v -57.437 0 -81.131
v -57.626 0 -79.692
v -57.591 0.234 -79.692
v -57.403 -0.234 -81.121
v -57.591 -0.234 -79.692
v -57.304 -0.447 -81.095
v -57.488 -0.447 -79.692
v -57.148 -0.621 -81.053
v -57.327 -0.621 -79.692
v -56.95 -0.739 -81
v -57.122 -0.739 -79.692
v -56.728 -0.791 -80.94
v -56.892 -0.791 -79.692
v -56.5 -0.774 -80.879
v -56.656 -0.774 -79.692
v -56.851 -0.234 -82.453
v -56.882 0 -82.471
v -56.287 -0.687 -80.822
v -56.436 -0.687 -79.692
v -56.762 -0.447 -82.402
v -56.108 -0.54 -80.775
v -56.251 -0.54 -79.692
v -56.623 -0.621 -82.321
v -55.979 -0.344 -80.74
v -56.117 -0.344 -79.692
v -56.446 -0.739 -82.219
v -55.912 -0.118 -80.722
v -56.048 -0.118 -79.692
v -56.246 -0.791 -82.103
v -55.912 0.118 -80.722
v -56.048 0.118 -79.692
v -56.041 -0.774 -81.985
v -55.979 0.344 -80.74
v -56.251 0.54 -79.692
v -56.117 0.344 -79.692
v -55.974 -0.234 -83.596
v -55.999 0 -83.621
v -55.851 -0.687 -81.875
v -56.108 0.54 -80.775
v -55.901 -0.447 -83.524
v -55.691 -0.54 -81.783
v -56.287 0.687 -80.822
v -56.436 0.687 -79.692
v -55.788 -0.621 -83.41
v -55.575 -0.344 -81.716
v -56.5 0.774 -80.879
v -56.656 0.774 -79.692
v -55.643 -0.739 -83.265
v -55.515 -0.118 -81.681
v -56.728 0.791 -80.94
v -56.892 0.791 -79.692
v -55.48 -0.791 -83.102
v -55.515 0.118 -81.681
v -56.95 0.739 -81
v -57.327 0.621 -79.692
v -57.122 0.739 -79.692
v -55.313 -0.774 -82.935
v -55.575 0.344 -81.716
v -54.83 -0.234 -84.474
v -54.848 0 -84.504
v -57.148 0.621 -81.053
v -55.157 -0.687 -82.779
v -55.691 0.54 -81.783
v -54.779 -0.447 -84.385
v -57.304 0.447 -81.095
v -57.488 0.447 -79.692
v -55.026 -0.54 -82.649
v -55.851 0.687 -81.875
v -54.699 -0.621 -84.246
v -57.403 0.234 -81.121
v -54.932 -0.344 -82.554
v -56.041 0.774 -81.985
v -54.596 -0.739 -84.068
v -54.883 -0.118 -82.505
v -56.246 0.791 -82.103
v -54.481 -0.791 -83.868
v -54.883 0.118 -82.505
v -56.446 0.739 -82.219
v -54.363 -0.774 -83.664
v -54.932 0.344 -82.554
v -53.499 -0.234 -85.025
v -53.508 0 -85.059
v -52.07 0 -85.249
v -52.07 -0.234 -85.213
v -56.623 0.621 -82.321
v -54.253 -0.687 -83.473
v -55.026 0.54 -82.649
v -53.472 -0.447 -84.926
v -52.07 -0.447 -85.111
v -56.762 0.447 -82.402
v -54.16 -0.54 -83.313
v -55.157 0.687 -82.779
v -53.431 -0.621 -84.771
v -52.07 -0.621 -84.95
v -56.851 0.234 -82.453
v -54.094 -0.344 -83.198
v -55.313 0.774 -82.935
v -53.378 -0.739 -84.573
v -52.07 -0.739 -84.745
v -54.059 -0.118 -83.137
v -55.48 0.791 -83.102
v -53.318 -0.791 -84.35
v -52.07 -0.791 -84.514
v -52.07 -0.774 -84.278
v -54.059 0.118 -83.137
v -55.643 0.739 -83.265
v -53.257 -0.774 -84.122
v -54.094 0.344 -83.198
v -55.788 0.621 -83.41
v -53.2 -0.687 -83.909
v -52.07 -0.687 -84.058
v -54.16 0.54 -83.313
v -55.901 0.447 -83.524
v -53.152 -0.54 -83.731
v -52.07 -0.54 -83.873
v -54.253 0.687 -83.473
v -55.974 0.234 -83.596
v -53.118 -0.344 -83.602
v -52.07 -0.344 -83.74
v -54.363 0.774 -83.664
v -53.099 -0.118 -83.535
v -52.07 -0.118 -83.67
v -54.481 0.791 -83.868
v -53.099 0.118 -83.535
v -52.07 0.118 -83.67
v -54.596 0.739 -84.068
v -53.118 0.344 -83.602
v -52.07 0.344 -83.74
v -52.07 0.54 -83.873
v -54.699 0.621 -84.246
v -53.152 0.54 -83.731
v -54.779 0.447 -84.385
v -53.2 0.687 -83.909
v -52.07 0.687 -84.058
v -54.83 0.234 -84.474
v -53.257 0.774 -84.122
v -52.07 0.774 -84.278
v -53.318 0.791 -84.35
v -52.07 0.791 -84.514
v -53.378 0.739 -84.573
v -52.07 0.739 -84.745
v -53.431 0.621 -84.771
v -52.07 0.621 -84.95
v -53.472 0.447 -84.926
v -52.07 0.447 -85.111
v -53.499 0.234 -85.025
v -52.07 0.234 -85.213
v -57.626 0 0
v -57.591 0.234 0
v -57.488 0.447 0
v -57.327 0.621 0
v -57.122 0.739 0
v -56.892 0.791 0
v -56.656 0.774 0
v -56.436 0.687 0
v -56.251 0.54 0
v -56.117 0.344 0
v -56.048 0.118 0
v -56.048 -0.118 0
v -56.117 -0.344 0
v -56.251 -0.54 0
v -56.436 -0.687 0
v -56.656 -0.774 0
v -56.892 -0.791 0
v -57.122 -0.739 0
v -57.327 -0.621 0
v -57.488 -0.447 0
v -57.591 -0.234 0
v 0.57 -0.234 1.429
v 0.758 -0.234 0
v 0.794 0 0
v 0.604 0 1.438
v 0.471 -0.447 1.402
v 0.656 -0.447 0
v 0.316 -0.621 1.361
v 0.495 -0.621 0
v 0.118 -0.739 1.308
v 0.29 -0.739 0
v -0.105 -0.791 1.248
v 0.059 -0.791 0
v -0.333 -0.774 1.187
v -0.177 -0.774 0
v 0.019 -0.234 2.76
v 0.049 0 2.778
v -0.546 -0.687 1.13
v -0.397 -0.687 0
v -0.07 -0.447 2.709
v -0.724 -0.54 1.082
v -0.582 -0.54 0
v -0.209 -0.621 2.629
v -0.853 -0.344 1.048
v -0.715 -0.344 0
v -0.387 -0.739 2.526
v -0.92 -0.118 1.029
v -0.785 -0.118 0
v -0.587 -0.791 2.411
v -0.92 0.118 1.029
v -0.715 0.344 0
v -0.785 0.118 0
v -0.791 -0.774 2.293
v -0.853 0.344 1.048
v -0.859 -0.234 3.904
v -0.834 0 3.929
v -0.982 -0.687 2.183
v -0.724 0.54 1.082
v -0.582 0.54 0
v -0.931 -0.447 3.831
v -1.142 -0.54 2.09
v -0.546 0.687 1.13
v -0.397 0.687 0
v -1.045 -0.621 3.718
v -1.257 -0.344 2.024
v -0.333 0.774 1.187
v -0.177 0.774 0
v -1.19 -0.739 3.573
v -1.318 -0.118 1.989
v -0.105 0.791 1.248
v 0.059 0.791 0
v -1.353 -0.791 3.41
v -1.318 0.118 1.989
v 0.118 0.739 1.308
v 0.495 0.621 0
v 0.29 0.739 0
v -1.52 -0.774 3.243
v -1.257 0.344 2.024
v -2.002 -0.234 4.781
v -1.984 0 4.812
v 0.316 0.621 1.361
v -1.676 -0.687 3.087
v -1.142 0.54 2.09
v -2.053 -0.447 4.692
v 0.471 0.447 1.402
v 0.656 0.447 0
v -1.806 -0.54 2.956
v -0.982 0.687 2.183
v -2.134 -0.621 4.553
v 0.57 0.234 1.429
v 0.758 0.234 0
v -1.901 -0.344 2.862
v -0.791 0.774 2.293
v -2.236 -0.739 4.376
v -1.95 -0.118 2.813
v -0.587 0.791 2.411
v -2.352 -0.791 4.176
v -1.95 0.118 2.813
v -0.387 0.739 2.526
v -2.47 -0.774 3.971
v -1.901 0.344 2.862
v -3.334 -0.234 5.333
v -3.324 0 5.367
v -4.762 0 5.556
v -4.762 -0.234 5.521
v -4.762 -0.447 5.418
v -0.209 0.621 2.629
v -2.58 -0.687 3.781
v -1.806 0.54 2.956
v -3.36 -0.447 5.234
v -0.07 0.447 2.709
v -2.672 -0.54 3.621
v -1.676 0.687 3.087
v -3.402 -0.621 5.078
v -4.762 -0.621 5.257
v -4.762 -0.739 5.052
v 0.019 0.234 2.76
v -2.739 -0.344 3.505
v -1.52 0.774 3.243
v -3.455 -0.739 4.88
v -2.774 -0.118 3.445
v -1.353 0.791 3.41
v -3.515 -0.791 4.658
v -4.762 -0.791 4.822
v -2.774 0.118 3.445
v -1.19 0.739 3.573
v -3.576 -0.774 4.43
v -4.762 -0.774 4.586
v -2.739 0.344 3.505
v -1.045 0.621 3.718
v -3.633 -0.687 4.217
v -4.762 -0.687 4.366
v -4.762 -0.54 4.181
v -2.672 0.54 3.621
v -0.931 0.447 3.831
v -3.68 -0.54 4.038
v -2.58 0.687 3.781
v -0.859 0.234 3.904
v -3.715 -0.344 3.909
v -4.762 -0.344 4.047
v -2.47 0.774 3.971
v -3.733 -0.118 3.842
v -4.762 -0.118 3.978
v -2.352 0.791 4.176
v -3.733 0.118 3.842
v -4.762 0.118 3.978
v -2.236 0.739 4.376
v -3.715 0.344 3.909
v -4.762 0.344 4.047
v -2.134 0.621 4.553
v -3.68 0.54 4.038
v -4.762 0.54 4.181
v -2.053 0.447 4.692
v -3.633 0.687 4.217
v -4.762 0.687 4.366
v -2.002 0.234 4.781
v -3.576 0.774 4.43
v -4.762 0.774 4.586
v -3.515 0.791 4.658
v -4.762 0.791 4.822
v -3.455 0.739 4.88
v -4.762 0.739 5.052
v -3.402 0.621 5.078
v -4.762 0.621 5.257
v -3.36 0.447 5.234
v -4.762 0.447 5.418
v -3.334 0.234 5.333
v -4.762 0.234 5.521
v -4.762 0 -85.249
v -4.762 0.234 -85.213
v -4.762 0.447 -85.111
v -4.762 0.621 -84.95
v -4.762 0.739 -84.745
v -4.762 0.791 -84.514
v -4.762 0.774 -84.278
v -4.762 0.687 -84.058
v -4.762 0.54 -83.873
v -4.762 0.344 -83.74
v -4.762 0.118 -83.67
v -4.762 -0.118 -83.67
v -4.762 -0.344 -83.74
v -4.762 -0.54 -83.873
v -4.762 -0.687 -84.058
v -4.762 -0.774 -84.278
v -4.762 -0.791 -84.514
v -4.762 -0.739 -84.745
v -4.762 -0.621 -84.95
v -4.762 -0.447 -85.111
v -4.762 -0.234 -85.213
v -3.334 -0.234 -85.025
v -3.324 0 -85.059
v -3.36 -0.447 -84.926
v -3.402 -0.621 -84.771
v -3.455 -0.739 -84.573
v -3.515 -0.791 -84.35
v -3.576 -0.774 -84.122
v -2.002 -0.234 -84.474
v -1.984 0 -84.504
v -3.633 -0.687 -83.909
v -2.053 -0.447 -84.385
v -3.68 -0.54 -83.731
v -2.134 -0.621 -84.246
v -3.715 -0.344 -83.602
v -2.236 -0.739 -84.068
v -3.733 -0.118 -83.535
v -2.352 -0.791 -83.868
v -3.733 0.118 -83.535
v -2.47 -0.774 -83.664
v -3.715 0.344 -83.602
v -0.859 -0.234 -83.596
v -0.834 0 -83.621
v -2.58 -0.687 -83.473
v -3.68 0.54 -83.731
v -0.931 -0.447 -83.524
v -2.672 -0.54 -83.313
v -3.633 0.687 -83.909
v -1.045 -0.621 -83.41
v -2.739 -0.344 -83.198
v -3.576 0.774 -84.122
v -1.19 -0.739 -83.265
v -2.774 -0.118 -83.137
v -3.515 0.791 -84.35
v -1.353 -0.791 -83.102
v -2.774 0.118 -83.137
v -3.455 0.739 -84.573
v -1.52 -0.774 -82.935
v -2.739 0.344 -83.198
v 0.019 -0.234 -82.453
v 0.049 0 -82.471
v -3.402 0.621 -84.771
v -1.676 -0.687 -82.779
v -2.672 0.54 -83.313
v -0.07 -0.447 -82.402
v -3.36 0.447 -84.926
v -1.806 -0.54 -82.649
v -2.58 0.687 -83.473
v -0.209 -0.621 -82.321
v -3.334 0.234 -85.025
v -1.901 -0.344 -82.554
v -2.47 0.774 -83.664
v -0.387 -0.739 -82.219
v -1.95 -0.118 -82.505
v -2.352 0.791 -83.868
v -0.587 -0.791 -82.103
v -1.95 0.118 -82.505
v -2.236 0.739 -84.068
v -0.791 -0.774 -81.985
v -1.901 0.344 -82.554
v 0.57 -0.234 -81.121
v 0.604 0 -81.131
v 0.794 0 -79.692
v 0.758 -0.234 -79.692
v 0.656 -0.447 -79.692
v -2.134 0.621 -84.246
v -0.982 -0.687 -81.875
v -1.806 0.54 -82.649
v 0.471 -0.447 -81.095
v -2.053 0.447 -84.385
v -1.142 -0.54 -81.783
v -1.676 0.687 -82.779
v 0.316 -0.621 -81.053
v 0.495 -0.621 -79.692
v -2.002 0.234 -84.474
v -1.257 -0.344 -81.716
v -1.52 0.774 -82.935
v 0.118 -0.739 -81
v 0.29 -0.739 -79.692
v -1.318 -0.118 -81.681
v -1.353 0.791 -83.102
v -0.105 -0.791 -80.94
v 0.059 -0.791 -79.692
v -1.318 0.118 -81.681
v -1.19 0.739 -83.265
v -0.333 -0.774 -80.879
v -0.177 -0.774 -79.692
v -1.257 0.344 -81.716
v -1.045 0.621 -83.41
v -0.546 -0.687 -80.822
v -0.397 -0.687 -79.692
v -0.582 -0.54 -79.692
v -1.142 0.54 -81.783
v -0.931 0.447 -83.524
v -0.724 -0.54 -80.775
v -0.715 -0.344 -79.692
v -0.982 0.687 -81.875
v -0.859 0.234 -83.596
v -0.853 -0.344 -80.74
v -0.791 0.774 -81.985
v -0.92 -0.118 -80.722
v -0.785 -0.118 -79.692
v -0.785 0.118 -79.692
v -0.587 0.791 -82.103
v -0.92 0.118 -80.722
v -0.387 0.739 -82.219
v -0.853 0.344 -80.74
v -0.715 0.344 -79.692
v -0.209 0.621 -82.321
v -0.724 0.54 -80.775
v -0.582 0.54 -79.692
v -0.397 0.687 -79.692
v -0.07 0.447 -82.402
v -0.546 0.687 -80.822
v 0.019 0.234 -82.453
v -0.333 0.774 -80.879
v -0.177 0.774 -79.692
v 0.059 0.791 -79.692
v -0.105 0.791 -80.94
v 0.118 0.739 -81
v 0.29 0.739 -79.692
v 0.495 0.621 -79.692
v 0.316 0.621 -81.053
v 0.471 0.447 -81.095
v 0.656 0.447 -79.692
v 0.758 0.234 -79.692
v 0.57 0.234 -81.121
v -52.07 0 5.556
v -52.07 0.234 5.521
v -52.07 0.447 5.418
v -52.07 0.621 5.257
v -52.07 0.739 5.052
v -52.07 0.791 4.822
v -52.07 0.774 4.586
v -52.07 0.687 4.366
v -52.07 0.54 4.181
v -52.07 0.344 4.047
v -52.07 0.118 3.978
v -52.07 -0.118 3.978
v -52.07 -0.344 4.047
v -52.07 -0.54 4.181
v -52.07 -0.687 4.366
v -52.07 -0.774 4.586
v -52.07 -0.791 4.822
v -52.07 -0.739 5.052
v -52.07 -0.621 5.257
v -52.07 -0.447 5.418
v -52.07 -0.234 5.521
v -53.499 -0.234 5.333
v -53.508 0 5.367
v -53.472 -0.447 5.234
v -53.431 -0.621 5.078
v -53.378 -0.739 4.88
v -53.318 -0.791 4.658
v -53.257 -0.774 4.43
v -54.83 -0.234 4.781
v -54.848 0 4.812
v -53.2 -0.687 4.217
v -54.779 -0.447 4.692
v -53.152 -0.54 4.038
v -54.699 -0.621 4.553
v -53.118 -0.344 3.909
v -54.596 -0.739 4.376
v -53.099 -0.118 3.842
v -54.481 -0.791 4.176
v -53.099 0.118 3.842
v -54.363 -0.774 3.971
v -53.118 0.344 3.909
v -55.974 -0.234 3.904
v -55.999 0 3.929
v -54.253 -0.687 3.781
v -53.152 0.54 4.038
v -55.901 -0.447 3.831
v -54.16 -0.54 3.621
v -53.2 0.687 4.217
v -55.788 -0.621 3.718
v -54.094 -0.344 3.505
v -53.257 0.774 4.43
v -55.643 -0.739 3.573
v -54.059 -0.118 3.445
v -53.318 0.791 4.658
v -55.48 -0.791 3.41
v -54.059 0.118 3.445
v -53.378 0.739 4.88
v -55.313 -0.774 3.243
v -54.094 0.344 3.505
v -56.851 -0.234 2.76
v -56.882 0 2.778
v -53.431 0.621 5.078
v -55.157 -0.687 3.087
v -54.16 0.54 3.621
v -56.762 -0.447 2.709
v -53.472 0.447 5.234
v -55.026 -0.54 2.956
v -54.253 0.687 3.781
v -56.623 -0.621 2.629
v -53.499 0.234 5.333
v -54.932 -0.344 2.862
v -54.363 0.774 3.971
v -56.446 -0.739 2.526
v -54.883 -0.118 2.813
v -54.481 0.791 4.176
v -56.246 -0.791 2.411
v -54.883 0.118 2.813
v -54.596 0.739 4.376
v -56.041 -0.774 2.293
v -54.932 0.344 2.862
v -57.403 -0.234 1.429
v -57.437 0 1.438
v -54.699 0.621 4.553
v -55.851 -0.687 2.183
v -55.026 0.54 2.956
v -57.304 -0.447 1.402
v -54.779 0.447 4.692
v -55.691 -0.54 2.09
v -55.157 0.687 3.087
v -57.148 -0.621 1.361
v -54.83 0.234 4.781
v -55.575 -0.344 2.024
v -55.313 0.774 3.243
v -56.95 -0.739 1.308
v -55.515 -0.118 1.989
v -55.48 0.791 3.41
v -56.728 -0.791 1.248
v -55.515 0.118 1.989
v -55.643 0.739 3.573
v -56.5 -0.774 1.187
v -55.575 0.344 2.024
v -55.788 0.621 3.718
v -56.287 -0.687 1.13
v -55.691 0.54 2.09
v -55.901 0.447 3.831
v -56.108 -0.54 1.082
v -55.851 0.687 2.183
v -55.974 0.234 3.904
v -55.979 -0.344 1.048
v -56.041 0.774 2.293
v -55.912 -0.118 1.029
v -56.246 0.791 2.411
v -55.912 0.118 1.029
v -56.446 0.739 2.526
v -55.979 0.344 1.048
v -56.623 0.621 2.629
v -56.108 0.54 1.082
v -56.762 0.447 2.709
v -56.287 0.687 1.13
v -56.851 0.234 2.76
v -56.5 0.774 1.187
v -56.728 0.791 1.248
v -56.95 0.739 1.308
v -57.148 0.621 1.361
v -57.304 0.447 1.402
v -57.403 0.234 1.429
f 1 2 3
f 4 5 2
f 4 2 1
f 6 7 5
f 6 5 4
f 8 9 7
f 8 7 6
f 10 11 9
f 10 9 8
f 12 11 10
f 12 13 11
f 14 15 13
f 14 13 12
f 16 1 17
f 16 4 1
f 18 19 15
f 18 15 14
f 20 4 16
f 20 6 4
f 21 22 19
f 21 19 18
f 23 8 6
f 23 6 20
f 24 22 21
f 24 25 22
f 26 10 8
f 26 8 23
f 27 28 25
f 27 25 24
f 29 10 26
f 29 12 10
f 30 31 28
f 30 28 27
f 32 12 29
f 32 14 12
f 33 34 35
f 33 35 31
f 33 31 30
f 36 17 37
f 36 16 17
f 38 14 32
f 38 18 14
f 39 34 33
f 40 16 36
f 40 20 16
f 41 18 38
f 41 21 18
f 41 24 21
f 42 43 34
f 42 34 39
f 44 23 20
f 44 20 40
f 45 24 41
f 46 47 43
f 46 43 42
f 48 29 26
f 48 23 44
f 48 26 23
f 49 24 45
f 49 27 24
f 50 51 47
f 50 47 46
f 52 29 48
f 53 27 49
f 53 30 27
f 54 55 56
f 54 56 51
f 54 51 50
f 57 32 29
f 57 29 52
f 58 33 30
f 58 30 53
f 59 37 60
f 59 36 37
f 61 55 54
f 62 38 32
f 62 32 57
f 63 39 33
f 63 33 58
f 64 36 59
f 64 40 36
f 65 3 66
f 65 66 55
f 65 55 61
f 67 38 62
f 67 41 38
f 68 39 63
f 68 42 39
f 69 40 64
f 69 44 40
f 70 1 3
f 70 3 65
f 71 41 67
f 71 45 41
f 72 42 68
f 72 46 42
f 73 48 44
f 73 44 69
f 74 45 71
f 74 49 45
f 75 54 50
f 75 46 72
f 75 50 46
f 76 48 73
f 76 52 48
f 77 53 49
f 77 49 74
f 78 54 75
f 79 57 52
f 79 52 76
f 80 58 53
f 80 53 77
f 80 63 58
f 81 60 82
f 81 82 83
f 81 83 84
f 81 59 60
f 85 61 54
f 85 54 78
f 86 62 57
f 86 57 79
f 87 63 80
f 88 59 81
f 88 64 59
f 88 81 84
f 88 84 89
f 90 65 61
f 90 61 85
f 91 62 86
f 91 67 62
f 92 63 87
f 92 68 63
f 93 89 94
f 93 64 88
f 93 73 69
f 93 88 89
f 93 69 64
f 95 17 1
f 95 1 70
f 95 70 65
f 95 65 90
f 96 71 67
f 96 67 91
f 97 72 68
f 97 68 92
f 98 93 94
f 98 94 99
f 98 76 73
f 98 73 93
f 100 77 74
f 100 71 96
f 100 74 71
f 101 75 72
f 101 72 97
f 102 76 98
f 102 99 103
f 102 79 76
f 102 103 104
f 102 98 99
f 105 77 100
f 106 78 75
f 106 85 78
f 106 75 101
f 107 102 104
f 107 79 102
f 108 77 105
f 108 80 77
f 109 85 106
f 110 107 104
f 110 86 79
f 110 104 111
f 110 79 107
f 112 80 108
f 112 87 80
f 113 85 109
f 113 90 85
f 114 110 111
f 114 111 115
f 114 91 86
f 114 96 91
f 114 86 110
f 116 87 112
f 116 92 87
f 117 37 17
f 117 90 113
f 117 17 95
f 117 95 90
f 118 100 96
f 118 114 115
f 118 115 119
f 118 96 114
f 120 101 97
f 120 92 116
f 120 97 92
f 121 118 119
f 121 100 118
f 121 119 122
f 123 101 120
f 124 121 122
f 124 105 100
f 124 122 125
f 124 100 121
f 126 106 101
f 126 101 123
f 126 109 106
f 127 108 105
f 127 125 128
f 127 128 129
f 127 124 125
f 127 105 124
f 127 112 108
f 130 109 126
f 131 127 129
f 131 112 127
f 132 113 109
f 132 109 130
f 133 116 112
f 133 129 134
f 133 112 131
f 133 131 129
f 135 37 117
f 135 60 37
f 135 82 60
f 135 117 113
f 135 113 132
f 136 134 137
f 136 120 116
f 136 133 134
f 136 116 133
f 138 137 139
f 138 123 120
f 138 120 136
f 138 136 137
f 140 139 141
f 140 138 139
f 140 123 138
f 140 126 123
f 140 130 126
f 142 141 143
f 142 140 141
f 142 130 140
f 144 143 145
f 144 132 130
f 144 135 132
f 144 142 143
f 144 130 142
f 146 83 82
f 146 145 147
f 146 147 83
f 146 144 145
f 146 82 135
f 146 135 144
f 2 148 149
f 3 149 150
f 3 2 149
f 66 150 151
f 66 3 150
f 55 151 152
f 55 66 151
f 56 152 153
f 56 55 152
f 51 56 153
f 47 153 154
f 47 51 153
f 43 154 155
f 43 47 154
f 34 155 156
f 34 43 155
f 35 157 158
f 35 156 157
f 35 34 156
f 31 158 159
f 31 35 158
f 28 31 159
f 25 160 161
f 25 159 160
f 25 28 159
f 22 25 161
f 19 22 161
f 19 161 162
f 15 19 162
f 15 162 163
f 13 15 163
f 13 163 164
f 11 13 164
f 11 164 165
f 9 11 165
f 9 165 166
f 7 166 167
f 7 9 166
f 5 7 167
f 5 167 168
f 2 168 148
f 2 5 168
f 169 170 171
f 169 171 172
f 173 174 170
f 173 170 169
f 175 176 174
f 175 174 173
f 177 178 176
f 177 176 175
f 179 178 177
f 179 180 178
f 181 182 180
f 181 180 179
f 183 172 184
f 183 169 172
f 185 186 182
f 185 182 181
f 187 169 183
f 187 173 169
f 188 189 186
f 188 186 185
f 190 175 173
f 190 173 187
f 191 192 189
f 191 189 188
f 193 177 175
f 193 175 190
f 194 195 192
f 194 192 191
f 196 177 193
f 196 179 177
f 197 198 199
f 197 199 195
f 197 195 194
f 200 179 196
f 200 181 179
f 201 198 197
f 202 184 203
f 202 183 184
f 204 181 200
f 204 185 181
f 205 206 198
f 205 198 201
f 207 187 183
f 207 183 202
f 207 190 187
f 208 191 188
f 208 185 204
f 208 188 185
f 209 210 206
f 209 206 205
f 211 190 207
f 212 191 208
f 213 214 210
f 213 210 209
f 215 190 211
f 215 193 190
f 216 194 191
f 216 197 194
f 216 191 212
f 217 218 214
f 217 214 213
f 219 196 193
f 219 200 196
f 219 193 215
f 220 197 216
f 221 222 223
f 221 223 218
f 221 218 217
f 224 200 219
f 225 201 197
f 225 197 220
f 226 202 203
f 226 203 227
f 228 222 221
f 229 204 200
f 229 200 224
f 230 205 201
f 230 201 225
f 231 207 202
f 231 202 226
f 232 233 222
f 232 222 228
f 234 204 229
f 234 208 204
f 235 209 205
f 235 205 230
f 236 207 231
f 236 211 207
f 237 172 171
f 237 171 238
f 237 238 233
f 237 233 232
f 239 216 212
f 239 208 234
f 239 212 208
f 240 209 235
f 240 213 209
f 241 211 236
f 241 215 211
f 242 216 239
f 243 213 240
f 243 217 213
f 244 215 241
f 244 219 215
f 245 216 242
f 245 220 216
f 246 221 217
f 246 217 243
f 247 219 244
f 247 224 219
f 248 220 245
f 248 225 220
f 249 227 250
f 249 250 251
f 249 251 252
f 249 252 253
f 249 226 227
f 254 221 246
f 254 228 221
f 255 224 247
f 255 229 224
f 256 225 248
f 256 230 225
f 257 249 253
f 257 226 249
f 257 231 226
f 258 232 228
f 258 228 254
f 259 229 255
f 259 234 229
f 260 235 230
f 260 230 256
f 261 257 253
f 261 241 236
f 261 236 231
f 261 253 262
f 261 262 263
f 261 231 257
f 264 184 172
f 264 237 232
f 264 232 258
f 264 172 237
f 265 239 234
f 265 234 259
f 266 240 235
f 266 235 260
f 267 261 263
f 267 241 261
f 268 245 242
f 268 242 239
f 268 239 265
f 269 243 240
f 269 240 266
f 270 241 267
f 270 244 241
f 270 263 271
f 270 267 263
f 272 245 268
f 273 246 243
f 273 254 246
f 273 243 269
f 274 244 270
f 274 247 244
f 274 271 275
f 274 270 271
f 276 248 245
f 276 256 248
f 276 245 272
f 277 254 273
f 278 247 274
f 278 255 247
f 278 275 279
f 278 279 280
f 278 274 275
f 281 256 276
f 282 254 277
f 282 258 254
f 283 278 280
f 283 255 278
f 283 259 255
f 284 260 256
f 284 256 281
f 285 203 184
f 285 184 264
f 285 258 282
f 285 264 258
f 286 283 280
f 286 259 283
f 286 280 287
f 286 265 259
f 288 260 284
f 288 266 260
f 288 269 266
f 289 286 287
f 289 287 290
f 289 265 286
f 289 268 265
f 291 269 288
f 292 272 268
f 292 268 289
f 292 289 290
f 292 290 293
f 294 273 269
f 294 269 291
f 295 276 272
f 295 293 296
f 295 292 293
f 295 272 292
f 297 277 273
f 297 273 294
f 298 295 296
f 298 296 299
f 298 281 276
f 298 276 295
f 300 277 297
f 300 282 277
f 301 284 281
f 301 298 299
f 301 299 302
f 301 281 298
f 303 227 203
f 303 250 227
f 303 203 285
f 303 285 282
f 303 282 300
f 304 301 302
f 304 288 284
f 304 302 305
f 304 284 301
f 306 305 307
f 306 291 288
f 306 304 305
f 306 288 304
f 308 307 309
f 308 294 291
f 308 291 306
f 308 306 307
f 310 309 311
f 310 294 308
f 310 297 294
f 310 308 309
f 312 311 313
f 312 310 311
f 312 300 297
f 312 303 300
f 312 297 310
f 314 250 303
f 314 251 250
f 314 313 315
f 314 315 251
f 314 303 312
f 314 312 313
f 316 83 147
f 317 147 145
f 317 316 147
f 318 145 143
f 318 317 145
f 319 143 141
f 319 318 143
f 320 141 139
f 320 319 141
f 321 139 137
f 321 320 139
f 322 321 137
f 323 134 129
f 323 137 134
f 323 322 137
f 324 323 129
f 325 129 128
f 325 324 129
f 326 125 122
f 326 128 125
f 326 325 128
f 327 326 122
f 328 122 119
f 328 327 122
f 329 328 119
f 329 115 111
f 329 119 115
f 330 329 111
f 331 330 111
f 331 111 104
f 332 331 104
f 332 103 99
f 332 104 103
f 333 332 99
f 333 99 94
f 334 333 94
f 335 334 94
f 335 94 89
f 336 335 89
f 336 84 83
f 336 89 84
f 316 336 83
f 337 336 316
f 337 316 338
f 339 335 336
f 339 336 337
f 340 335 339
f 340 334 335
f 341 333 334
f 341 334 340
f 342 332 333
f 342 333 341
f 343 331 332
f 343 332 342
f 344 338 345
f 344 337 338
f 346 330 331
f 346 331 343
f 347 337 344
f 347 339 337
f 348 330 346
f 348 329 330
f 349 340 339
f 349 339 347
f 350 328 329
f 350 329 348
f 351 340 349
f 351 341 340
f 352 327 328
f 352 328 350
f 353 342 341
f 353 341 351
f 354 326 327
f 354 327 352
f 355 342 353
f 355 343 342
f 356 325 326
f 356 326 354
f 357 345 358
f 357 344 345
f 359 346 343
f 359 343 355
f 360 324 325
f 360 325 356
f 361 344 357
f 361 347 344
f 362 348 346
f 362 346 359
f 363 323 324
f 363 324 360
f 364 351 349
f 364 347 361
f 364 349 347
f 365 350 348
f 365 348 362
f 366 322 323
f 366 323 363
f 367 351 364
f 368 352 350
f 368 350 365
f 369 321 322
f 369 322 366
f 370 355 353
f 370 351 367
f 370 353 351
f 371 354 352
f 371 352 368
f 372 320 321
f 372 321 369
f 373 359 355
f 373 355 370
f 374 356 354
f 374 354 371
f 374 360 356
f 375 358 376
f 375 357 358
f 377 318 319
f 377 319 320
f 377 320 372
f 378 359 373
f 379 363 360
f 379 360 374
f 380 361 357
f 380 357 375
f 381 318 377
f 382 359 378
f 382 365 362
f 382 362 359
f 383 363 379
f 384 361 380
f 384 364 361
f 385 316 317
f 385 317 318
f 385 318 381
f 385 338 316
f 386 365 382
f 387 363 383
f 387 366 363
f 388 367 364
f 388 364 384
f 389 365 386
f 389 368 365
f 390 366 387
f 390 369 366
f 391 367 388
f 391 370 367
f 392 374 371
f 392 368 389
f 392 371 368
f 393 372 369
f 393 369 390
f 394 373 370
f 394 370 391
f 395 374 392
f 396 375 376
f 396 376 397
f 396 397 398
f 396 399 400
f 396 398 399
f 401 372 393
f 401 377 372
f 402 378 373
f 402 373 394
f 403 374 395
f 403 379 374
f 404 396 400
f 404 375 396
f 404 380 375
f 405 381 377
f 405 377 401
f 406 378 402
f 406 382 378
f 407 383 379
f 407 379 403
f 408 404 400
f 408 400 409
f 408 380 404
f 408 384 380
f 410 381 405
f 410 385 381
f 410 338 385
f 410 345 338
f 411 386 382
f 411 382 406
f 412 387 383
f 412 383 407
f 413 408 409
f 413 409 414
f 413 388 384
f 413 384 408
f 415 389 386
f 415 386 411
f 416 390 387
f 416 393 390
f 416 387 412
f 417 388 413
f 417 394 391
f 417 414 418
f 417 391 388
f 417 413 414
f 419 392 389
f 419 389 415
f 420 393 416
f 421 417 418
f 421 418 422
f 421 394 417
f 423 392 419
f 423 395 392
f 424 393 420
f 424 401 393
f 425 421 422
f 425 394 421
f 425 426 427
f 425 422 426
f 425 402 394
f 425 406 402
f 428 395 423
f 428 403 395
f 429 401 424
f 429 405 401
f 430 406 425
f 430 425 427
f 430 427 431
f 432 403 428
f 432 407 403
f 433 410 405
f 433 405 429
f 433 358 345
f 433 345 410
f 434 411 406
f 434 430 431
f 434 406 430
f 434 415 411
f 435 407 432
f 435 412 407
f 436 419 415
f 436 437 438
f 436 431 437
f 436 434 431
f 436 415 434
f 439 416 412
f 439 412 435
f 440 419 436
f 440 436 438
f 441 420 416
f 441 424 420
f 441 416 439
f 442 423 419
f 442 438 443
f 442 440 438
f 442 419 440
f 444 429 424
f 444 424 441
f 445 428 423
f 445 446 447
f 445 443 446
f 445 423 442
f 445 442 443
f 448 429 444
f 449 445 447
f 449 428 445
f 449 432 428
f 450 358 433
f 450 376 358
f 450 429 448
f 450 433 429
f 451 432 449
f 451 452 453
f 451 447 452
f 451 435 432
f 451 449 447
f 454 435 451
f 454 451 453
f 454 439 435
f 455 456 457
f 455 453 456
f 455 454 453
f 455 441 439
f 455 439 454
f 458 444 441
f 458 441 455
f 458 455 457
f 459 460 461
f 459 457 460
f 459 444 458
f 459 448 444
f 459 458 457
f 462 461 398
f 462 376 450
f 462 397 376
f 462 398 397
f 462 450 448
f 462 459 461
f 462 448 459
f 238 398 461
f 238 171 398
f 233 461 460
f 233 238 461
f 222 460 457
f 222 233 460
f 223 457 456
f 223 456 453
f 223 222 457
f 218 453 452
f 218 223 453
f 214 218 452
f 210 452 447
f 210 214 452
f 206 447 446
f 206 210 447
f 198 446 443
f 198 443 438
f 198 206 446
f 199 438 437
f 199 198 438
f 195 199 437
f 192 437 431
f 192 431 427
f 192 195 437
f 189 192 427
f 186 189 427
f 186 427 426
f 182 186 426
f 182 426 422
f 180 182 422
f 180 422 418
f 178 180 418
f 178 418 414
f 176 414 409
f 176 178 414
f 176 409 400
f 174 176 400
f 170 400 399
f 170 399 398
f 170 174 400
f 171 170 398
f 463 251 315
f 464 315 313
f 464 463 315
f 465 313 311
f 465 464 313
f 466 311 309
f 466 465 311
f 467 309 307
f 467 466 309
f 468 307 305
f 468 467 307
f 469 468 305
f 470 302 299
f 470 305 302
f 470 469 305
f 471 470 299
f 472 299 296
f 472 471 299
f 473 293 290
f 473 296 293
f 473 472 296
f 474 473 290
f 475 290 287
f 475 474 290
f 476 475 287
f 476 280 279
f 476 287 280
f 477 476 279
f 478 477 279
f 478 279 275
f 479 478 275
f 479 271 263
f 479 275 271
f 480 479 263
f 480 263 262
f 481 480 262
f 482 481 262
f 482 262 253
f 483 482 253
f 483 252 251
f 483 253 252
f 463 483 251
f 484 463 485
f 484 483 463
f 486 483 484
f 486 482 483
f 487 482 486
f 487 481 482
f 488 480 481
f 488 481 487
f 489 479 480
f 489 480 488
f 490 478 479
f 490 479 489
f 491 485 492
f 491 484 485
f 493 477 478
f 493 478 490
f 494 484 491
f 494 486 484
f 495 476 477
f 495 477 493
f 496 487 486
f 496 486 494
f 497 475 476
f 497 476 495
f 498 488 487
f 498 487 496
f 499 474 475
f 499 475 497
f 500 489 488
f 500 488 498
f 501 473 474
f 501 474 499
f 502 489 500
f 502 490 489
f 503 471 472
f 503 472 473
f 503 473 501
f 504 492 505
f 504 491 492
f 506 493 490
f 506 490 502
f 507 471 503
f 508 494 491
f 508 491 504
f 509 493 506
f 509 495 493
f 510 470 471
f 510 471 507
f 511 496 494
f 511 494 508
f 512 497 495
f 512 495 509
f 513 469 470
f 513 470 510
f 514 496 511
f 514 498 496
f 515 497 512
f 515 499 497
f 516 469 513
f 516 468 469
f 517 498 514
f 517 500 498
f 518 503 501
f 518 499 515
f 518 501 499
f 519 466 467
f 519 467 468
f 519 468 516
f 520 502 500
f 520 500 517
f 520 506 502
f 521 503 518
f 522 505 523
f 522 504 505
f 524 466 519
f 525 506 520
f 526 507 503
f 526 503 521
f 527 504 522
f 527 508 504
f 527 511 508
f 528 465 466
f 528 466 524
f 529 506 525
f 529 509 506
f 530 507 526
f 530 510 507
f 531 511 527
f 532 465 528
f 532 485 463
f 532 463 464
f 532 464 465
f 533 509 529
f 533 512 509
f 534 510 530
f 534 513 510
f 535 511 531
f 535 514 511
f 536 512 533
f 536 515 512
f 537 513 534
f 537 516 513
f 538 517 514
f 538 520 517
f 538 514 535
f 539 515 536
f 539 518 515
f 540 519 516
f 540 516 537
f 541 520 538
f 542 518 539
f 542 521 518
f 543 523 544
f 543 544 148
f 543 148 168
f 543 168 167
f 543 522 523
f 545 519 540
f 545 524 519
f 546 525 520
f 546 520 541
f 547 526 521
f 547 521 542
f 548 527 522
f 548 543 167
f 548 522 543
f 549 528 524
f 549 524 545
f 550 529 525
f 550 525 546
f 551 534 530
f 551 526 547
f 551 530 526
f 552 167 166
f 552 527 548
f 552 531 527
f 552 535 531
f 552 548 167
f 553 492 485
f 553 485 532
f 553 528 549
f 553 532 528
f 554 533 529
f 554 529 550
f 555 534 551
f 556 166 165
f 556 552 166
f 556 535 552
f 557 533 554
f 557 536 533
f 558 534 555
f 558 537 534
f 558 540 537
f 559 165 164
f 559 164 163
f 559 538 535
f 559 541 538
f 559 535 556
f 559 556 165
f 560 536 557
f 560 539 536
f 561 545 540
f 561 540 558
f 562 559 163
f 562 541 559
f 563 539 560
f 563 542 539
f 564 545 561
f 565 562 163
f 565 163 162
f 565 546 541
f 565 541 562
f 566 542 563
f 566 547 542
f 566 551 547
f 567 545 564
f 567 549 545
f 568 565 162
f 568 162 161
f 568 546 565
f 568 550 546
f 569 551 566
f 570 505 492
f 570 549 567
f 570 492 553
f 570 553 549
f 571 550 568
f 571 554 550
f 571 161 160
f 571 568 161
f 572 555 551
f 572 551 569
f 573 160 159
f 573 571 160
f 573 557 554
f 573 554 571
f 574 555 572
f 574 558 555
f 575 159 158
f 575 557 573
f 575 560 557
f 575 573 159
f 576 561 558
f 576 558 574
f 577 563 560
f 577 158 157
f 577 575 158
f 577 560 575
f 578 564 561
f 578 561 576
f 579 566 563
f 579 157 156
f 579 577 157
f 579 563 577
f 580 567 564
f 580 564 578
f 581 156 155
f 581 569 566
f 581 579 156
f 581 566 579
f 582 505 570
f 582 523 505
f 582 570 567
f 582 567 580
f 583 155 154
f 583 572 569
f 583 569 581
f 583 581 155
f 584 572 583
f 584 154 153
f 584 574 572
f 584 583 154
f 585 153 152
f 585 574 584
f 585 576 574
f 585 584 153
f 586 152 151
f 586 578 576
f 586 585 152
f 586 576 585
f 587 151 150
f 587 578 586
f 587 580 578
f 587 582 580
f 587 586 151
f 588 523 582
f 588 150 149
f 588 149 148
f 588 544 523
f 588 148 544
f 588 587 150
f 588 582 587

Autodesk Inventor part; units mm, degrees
ref_plane "YZ Plane" through (0, 0, 0) normal (1, 0, 0) x (0, 1, 0)
ref_plane "XZ Plane" through (0, 0, 0) normal (0, 1, 0) x (-1, 0, 0)
ref_plane "XY Plane" through (0, 0, 0) normal (0, 0, 1) x (1, 0, 0)
sketch "Sketch2" plane through (0, 0, 0) normal (0, 0, 1) x (1, 0, 0)
  circle A0 centre (0, 0) radius 0.7937
  dimension "d0" = 1.5875
sketch "Sketch3" plane through (0, 0, 0) normal (0, 1, 0) x (-1, 0, 0)
  line L0 (4.7625, 4.7625) -> (52.07, 4.7625)
  line L1 (56.8325, 0) -> (56.8325, -79.6925)
  line L2 (52.07, -84.455) -> (4.7625, -84.455)
  line L3 (0, -79.6925) -> (0, 0)
  arc A0 (56.8325, 0) -> (52.07, 4.7625) centre (52.07, 0) ccw
  arc A1 (52.07, -84.455) -> (56.8325, -79.6925) centre (52.07, -79.6925) ccw
  arc A2 (0, -79.6925) -> (4.7625, -84.455) centre (4.7625, -79.6925) ccw
  arc A3 (4.7625, 4.7625) -> (0, 0) centre (4.7625, 0) ccw
  dimension "d1" = 4.7625
  dimension "d2" = 89.2175
  dimension "d3" = 56.8325
sweep "Sweep1" add profiles "Sketch2" path "Sketch3"
properties part number "BatteryCaseORing" material "Rubber, Silicone"
